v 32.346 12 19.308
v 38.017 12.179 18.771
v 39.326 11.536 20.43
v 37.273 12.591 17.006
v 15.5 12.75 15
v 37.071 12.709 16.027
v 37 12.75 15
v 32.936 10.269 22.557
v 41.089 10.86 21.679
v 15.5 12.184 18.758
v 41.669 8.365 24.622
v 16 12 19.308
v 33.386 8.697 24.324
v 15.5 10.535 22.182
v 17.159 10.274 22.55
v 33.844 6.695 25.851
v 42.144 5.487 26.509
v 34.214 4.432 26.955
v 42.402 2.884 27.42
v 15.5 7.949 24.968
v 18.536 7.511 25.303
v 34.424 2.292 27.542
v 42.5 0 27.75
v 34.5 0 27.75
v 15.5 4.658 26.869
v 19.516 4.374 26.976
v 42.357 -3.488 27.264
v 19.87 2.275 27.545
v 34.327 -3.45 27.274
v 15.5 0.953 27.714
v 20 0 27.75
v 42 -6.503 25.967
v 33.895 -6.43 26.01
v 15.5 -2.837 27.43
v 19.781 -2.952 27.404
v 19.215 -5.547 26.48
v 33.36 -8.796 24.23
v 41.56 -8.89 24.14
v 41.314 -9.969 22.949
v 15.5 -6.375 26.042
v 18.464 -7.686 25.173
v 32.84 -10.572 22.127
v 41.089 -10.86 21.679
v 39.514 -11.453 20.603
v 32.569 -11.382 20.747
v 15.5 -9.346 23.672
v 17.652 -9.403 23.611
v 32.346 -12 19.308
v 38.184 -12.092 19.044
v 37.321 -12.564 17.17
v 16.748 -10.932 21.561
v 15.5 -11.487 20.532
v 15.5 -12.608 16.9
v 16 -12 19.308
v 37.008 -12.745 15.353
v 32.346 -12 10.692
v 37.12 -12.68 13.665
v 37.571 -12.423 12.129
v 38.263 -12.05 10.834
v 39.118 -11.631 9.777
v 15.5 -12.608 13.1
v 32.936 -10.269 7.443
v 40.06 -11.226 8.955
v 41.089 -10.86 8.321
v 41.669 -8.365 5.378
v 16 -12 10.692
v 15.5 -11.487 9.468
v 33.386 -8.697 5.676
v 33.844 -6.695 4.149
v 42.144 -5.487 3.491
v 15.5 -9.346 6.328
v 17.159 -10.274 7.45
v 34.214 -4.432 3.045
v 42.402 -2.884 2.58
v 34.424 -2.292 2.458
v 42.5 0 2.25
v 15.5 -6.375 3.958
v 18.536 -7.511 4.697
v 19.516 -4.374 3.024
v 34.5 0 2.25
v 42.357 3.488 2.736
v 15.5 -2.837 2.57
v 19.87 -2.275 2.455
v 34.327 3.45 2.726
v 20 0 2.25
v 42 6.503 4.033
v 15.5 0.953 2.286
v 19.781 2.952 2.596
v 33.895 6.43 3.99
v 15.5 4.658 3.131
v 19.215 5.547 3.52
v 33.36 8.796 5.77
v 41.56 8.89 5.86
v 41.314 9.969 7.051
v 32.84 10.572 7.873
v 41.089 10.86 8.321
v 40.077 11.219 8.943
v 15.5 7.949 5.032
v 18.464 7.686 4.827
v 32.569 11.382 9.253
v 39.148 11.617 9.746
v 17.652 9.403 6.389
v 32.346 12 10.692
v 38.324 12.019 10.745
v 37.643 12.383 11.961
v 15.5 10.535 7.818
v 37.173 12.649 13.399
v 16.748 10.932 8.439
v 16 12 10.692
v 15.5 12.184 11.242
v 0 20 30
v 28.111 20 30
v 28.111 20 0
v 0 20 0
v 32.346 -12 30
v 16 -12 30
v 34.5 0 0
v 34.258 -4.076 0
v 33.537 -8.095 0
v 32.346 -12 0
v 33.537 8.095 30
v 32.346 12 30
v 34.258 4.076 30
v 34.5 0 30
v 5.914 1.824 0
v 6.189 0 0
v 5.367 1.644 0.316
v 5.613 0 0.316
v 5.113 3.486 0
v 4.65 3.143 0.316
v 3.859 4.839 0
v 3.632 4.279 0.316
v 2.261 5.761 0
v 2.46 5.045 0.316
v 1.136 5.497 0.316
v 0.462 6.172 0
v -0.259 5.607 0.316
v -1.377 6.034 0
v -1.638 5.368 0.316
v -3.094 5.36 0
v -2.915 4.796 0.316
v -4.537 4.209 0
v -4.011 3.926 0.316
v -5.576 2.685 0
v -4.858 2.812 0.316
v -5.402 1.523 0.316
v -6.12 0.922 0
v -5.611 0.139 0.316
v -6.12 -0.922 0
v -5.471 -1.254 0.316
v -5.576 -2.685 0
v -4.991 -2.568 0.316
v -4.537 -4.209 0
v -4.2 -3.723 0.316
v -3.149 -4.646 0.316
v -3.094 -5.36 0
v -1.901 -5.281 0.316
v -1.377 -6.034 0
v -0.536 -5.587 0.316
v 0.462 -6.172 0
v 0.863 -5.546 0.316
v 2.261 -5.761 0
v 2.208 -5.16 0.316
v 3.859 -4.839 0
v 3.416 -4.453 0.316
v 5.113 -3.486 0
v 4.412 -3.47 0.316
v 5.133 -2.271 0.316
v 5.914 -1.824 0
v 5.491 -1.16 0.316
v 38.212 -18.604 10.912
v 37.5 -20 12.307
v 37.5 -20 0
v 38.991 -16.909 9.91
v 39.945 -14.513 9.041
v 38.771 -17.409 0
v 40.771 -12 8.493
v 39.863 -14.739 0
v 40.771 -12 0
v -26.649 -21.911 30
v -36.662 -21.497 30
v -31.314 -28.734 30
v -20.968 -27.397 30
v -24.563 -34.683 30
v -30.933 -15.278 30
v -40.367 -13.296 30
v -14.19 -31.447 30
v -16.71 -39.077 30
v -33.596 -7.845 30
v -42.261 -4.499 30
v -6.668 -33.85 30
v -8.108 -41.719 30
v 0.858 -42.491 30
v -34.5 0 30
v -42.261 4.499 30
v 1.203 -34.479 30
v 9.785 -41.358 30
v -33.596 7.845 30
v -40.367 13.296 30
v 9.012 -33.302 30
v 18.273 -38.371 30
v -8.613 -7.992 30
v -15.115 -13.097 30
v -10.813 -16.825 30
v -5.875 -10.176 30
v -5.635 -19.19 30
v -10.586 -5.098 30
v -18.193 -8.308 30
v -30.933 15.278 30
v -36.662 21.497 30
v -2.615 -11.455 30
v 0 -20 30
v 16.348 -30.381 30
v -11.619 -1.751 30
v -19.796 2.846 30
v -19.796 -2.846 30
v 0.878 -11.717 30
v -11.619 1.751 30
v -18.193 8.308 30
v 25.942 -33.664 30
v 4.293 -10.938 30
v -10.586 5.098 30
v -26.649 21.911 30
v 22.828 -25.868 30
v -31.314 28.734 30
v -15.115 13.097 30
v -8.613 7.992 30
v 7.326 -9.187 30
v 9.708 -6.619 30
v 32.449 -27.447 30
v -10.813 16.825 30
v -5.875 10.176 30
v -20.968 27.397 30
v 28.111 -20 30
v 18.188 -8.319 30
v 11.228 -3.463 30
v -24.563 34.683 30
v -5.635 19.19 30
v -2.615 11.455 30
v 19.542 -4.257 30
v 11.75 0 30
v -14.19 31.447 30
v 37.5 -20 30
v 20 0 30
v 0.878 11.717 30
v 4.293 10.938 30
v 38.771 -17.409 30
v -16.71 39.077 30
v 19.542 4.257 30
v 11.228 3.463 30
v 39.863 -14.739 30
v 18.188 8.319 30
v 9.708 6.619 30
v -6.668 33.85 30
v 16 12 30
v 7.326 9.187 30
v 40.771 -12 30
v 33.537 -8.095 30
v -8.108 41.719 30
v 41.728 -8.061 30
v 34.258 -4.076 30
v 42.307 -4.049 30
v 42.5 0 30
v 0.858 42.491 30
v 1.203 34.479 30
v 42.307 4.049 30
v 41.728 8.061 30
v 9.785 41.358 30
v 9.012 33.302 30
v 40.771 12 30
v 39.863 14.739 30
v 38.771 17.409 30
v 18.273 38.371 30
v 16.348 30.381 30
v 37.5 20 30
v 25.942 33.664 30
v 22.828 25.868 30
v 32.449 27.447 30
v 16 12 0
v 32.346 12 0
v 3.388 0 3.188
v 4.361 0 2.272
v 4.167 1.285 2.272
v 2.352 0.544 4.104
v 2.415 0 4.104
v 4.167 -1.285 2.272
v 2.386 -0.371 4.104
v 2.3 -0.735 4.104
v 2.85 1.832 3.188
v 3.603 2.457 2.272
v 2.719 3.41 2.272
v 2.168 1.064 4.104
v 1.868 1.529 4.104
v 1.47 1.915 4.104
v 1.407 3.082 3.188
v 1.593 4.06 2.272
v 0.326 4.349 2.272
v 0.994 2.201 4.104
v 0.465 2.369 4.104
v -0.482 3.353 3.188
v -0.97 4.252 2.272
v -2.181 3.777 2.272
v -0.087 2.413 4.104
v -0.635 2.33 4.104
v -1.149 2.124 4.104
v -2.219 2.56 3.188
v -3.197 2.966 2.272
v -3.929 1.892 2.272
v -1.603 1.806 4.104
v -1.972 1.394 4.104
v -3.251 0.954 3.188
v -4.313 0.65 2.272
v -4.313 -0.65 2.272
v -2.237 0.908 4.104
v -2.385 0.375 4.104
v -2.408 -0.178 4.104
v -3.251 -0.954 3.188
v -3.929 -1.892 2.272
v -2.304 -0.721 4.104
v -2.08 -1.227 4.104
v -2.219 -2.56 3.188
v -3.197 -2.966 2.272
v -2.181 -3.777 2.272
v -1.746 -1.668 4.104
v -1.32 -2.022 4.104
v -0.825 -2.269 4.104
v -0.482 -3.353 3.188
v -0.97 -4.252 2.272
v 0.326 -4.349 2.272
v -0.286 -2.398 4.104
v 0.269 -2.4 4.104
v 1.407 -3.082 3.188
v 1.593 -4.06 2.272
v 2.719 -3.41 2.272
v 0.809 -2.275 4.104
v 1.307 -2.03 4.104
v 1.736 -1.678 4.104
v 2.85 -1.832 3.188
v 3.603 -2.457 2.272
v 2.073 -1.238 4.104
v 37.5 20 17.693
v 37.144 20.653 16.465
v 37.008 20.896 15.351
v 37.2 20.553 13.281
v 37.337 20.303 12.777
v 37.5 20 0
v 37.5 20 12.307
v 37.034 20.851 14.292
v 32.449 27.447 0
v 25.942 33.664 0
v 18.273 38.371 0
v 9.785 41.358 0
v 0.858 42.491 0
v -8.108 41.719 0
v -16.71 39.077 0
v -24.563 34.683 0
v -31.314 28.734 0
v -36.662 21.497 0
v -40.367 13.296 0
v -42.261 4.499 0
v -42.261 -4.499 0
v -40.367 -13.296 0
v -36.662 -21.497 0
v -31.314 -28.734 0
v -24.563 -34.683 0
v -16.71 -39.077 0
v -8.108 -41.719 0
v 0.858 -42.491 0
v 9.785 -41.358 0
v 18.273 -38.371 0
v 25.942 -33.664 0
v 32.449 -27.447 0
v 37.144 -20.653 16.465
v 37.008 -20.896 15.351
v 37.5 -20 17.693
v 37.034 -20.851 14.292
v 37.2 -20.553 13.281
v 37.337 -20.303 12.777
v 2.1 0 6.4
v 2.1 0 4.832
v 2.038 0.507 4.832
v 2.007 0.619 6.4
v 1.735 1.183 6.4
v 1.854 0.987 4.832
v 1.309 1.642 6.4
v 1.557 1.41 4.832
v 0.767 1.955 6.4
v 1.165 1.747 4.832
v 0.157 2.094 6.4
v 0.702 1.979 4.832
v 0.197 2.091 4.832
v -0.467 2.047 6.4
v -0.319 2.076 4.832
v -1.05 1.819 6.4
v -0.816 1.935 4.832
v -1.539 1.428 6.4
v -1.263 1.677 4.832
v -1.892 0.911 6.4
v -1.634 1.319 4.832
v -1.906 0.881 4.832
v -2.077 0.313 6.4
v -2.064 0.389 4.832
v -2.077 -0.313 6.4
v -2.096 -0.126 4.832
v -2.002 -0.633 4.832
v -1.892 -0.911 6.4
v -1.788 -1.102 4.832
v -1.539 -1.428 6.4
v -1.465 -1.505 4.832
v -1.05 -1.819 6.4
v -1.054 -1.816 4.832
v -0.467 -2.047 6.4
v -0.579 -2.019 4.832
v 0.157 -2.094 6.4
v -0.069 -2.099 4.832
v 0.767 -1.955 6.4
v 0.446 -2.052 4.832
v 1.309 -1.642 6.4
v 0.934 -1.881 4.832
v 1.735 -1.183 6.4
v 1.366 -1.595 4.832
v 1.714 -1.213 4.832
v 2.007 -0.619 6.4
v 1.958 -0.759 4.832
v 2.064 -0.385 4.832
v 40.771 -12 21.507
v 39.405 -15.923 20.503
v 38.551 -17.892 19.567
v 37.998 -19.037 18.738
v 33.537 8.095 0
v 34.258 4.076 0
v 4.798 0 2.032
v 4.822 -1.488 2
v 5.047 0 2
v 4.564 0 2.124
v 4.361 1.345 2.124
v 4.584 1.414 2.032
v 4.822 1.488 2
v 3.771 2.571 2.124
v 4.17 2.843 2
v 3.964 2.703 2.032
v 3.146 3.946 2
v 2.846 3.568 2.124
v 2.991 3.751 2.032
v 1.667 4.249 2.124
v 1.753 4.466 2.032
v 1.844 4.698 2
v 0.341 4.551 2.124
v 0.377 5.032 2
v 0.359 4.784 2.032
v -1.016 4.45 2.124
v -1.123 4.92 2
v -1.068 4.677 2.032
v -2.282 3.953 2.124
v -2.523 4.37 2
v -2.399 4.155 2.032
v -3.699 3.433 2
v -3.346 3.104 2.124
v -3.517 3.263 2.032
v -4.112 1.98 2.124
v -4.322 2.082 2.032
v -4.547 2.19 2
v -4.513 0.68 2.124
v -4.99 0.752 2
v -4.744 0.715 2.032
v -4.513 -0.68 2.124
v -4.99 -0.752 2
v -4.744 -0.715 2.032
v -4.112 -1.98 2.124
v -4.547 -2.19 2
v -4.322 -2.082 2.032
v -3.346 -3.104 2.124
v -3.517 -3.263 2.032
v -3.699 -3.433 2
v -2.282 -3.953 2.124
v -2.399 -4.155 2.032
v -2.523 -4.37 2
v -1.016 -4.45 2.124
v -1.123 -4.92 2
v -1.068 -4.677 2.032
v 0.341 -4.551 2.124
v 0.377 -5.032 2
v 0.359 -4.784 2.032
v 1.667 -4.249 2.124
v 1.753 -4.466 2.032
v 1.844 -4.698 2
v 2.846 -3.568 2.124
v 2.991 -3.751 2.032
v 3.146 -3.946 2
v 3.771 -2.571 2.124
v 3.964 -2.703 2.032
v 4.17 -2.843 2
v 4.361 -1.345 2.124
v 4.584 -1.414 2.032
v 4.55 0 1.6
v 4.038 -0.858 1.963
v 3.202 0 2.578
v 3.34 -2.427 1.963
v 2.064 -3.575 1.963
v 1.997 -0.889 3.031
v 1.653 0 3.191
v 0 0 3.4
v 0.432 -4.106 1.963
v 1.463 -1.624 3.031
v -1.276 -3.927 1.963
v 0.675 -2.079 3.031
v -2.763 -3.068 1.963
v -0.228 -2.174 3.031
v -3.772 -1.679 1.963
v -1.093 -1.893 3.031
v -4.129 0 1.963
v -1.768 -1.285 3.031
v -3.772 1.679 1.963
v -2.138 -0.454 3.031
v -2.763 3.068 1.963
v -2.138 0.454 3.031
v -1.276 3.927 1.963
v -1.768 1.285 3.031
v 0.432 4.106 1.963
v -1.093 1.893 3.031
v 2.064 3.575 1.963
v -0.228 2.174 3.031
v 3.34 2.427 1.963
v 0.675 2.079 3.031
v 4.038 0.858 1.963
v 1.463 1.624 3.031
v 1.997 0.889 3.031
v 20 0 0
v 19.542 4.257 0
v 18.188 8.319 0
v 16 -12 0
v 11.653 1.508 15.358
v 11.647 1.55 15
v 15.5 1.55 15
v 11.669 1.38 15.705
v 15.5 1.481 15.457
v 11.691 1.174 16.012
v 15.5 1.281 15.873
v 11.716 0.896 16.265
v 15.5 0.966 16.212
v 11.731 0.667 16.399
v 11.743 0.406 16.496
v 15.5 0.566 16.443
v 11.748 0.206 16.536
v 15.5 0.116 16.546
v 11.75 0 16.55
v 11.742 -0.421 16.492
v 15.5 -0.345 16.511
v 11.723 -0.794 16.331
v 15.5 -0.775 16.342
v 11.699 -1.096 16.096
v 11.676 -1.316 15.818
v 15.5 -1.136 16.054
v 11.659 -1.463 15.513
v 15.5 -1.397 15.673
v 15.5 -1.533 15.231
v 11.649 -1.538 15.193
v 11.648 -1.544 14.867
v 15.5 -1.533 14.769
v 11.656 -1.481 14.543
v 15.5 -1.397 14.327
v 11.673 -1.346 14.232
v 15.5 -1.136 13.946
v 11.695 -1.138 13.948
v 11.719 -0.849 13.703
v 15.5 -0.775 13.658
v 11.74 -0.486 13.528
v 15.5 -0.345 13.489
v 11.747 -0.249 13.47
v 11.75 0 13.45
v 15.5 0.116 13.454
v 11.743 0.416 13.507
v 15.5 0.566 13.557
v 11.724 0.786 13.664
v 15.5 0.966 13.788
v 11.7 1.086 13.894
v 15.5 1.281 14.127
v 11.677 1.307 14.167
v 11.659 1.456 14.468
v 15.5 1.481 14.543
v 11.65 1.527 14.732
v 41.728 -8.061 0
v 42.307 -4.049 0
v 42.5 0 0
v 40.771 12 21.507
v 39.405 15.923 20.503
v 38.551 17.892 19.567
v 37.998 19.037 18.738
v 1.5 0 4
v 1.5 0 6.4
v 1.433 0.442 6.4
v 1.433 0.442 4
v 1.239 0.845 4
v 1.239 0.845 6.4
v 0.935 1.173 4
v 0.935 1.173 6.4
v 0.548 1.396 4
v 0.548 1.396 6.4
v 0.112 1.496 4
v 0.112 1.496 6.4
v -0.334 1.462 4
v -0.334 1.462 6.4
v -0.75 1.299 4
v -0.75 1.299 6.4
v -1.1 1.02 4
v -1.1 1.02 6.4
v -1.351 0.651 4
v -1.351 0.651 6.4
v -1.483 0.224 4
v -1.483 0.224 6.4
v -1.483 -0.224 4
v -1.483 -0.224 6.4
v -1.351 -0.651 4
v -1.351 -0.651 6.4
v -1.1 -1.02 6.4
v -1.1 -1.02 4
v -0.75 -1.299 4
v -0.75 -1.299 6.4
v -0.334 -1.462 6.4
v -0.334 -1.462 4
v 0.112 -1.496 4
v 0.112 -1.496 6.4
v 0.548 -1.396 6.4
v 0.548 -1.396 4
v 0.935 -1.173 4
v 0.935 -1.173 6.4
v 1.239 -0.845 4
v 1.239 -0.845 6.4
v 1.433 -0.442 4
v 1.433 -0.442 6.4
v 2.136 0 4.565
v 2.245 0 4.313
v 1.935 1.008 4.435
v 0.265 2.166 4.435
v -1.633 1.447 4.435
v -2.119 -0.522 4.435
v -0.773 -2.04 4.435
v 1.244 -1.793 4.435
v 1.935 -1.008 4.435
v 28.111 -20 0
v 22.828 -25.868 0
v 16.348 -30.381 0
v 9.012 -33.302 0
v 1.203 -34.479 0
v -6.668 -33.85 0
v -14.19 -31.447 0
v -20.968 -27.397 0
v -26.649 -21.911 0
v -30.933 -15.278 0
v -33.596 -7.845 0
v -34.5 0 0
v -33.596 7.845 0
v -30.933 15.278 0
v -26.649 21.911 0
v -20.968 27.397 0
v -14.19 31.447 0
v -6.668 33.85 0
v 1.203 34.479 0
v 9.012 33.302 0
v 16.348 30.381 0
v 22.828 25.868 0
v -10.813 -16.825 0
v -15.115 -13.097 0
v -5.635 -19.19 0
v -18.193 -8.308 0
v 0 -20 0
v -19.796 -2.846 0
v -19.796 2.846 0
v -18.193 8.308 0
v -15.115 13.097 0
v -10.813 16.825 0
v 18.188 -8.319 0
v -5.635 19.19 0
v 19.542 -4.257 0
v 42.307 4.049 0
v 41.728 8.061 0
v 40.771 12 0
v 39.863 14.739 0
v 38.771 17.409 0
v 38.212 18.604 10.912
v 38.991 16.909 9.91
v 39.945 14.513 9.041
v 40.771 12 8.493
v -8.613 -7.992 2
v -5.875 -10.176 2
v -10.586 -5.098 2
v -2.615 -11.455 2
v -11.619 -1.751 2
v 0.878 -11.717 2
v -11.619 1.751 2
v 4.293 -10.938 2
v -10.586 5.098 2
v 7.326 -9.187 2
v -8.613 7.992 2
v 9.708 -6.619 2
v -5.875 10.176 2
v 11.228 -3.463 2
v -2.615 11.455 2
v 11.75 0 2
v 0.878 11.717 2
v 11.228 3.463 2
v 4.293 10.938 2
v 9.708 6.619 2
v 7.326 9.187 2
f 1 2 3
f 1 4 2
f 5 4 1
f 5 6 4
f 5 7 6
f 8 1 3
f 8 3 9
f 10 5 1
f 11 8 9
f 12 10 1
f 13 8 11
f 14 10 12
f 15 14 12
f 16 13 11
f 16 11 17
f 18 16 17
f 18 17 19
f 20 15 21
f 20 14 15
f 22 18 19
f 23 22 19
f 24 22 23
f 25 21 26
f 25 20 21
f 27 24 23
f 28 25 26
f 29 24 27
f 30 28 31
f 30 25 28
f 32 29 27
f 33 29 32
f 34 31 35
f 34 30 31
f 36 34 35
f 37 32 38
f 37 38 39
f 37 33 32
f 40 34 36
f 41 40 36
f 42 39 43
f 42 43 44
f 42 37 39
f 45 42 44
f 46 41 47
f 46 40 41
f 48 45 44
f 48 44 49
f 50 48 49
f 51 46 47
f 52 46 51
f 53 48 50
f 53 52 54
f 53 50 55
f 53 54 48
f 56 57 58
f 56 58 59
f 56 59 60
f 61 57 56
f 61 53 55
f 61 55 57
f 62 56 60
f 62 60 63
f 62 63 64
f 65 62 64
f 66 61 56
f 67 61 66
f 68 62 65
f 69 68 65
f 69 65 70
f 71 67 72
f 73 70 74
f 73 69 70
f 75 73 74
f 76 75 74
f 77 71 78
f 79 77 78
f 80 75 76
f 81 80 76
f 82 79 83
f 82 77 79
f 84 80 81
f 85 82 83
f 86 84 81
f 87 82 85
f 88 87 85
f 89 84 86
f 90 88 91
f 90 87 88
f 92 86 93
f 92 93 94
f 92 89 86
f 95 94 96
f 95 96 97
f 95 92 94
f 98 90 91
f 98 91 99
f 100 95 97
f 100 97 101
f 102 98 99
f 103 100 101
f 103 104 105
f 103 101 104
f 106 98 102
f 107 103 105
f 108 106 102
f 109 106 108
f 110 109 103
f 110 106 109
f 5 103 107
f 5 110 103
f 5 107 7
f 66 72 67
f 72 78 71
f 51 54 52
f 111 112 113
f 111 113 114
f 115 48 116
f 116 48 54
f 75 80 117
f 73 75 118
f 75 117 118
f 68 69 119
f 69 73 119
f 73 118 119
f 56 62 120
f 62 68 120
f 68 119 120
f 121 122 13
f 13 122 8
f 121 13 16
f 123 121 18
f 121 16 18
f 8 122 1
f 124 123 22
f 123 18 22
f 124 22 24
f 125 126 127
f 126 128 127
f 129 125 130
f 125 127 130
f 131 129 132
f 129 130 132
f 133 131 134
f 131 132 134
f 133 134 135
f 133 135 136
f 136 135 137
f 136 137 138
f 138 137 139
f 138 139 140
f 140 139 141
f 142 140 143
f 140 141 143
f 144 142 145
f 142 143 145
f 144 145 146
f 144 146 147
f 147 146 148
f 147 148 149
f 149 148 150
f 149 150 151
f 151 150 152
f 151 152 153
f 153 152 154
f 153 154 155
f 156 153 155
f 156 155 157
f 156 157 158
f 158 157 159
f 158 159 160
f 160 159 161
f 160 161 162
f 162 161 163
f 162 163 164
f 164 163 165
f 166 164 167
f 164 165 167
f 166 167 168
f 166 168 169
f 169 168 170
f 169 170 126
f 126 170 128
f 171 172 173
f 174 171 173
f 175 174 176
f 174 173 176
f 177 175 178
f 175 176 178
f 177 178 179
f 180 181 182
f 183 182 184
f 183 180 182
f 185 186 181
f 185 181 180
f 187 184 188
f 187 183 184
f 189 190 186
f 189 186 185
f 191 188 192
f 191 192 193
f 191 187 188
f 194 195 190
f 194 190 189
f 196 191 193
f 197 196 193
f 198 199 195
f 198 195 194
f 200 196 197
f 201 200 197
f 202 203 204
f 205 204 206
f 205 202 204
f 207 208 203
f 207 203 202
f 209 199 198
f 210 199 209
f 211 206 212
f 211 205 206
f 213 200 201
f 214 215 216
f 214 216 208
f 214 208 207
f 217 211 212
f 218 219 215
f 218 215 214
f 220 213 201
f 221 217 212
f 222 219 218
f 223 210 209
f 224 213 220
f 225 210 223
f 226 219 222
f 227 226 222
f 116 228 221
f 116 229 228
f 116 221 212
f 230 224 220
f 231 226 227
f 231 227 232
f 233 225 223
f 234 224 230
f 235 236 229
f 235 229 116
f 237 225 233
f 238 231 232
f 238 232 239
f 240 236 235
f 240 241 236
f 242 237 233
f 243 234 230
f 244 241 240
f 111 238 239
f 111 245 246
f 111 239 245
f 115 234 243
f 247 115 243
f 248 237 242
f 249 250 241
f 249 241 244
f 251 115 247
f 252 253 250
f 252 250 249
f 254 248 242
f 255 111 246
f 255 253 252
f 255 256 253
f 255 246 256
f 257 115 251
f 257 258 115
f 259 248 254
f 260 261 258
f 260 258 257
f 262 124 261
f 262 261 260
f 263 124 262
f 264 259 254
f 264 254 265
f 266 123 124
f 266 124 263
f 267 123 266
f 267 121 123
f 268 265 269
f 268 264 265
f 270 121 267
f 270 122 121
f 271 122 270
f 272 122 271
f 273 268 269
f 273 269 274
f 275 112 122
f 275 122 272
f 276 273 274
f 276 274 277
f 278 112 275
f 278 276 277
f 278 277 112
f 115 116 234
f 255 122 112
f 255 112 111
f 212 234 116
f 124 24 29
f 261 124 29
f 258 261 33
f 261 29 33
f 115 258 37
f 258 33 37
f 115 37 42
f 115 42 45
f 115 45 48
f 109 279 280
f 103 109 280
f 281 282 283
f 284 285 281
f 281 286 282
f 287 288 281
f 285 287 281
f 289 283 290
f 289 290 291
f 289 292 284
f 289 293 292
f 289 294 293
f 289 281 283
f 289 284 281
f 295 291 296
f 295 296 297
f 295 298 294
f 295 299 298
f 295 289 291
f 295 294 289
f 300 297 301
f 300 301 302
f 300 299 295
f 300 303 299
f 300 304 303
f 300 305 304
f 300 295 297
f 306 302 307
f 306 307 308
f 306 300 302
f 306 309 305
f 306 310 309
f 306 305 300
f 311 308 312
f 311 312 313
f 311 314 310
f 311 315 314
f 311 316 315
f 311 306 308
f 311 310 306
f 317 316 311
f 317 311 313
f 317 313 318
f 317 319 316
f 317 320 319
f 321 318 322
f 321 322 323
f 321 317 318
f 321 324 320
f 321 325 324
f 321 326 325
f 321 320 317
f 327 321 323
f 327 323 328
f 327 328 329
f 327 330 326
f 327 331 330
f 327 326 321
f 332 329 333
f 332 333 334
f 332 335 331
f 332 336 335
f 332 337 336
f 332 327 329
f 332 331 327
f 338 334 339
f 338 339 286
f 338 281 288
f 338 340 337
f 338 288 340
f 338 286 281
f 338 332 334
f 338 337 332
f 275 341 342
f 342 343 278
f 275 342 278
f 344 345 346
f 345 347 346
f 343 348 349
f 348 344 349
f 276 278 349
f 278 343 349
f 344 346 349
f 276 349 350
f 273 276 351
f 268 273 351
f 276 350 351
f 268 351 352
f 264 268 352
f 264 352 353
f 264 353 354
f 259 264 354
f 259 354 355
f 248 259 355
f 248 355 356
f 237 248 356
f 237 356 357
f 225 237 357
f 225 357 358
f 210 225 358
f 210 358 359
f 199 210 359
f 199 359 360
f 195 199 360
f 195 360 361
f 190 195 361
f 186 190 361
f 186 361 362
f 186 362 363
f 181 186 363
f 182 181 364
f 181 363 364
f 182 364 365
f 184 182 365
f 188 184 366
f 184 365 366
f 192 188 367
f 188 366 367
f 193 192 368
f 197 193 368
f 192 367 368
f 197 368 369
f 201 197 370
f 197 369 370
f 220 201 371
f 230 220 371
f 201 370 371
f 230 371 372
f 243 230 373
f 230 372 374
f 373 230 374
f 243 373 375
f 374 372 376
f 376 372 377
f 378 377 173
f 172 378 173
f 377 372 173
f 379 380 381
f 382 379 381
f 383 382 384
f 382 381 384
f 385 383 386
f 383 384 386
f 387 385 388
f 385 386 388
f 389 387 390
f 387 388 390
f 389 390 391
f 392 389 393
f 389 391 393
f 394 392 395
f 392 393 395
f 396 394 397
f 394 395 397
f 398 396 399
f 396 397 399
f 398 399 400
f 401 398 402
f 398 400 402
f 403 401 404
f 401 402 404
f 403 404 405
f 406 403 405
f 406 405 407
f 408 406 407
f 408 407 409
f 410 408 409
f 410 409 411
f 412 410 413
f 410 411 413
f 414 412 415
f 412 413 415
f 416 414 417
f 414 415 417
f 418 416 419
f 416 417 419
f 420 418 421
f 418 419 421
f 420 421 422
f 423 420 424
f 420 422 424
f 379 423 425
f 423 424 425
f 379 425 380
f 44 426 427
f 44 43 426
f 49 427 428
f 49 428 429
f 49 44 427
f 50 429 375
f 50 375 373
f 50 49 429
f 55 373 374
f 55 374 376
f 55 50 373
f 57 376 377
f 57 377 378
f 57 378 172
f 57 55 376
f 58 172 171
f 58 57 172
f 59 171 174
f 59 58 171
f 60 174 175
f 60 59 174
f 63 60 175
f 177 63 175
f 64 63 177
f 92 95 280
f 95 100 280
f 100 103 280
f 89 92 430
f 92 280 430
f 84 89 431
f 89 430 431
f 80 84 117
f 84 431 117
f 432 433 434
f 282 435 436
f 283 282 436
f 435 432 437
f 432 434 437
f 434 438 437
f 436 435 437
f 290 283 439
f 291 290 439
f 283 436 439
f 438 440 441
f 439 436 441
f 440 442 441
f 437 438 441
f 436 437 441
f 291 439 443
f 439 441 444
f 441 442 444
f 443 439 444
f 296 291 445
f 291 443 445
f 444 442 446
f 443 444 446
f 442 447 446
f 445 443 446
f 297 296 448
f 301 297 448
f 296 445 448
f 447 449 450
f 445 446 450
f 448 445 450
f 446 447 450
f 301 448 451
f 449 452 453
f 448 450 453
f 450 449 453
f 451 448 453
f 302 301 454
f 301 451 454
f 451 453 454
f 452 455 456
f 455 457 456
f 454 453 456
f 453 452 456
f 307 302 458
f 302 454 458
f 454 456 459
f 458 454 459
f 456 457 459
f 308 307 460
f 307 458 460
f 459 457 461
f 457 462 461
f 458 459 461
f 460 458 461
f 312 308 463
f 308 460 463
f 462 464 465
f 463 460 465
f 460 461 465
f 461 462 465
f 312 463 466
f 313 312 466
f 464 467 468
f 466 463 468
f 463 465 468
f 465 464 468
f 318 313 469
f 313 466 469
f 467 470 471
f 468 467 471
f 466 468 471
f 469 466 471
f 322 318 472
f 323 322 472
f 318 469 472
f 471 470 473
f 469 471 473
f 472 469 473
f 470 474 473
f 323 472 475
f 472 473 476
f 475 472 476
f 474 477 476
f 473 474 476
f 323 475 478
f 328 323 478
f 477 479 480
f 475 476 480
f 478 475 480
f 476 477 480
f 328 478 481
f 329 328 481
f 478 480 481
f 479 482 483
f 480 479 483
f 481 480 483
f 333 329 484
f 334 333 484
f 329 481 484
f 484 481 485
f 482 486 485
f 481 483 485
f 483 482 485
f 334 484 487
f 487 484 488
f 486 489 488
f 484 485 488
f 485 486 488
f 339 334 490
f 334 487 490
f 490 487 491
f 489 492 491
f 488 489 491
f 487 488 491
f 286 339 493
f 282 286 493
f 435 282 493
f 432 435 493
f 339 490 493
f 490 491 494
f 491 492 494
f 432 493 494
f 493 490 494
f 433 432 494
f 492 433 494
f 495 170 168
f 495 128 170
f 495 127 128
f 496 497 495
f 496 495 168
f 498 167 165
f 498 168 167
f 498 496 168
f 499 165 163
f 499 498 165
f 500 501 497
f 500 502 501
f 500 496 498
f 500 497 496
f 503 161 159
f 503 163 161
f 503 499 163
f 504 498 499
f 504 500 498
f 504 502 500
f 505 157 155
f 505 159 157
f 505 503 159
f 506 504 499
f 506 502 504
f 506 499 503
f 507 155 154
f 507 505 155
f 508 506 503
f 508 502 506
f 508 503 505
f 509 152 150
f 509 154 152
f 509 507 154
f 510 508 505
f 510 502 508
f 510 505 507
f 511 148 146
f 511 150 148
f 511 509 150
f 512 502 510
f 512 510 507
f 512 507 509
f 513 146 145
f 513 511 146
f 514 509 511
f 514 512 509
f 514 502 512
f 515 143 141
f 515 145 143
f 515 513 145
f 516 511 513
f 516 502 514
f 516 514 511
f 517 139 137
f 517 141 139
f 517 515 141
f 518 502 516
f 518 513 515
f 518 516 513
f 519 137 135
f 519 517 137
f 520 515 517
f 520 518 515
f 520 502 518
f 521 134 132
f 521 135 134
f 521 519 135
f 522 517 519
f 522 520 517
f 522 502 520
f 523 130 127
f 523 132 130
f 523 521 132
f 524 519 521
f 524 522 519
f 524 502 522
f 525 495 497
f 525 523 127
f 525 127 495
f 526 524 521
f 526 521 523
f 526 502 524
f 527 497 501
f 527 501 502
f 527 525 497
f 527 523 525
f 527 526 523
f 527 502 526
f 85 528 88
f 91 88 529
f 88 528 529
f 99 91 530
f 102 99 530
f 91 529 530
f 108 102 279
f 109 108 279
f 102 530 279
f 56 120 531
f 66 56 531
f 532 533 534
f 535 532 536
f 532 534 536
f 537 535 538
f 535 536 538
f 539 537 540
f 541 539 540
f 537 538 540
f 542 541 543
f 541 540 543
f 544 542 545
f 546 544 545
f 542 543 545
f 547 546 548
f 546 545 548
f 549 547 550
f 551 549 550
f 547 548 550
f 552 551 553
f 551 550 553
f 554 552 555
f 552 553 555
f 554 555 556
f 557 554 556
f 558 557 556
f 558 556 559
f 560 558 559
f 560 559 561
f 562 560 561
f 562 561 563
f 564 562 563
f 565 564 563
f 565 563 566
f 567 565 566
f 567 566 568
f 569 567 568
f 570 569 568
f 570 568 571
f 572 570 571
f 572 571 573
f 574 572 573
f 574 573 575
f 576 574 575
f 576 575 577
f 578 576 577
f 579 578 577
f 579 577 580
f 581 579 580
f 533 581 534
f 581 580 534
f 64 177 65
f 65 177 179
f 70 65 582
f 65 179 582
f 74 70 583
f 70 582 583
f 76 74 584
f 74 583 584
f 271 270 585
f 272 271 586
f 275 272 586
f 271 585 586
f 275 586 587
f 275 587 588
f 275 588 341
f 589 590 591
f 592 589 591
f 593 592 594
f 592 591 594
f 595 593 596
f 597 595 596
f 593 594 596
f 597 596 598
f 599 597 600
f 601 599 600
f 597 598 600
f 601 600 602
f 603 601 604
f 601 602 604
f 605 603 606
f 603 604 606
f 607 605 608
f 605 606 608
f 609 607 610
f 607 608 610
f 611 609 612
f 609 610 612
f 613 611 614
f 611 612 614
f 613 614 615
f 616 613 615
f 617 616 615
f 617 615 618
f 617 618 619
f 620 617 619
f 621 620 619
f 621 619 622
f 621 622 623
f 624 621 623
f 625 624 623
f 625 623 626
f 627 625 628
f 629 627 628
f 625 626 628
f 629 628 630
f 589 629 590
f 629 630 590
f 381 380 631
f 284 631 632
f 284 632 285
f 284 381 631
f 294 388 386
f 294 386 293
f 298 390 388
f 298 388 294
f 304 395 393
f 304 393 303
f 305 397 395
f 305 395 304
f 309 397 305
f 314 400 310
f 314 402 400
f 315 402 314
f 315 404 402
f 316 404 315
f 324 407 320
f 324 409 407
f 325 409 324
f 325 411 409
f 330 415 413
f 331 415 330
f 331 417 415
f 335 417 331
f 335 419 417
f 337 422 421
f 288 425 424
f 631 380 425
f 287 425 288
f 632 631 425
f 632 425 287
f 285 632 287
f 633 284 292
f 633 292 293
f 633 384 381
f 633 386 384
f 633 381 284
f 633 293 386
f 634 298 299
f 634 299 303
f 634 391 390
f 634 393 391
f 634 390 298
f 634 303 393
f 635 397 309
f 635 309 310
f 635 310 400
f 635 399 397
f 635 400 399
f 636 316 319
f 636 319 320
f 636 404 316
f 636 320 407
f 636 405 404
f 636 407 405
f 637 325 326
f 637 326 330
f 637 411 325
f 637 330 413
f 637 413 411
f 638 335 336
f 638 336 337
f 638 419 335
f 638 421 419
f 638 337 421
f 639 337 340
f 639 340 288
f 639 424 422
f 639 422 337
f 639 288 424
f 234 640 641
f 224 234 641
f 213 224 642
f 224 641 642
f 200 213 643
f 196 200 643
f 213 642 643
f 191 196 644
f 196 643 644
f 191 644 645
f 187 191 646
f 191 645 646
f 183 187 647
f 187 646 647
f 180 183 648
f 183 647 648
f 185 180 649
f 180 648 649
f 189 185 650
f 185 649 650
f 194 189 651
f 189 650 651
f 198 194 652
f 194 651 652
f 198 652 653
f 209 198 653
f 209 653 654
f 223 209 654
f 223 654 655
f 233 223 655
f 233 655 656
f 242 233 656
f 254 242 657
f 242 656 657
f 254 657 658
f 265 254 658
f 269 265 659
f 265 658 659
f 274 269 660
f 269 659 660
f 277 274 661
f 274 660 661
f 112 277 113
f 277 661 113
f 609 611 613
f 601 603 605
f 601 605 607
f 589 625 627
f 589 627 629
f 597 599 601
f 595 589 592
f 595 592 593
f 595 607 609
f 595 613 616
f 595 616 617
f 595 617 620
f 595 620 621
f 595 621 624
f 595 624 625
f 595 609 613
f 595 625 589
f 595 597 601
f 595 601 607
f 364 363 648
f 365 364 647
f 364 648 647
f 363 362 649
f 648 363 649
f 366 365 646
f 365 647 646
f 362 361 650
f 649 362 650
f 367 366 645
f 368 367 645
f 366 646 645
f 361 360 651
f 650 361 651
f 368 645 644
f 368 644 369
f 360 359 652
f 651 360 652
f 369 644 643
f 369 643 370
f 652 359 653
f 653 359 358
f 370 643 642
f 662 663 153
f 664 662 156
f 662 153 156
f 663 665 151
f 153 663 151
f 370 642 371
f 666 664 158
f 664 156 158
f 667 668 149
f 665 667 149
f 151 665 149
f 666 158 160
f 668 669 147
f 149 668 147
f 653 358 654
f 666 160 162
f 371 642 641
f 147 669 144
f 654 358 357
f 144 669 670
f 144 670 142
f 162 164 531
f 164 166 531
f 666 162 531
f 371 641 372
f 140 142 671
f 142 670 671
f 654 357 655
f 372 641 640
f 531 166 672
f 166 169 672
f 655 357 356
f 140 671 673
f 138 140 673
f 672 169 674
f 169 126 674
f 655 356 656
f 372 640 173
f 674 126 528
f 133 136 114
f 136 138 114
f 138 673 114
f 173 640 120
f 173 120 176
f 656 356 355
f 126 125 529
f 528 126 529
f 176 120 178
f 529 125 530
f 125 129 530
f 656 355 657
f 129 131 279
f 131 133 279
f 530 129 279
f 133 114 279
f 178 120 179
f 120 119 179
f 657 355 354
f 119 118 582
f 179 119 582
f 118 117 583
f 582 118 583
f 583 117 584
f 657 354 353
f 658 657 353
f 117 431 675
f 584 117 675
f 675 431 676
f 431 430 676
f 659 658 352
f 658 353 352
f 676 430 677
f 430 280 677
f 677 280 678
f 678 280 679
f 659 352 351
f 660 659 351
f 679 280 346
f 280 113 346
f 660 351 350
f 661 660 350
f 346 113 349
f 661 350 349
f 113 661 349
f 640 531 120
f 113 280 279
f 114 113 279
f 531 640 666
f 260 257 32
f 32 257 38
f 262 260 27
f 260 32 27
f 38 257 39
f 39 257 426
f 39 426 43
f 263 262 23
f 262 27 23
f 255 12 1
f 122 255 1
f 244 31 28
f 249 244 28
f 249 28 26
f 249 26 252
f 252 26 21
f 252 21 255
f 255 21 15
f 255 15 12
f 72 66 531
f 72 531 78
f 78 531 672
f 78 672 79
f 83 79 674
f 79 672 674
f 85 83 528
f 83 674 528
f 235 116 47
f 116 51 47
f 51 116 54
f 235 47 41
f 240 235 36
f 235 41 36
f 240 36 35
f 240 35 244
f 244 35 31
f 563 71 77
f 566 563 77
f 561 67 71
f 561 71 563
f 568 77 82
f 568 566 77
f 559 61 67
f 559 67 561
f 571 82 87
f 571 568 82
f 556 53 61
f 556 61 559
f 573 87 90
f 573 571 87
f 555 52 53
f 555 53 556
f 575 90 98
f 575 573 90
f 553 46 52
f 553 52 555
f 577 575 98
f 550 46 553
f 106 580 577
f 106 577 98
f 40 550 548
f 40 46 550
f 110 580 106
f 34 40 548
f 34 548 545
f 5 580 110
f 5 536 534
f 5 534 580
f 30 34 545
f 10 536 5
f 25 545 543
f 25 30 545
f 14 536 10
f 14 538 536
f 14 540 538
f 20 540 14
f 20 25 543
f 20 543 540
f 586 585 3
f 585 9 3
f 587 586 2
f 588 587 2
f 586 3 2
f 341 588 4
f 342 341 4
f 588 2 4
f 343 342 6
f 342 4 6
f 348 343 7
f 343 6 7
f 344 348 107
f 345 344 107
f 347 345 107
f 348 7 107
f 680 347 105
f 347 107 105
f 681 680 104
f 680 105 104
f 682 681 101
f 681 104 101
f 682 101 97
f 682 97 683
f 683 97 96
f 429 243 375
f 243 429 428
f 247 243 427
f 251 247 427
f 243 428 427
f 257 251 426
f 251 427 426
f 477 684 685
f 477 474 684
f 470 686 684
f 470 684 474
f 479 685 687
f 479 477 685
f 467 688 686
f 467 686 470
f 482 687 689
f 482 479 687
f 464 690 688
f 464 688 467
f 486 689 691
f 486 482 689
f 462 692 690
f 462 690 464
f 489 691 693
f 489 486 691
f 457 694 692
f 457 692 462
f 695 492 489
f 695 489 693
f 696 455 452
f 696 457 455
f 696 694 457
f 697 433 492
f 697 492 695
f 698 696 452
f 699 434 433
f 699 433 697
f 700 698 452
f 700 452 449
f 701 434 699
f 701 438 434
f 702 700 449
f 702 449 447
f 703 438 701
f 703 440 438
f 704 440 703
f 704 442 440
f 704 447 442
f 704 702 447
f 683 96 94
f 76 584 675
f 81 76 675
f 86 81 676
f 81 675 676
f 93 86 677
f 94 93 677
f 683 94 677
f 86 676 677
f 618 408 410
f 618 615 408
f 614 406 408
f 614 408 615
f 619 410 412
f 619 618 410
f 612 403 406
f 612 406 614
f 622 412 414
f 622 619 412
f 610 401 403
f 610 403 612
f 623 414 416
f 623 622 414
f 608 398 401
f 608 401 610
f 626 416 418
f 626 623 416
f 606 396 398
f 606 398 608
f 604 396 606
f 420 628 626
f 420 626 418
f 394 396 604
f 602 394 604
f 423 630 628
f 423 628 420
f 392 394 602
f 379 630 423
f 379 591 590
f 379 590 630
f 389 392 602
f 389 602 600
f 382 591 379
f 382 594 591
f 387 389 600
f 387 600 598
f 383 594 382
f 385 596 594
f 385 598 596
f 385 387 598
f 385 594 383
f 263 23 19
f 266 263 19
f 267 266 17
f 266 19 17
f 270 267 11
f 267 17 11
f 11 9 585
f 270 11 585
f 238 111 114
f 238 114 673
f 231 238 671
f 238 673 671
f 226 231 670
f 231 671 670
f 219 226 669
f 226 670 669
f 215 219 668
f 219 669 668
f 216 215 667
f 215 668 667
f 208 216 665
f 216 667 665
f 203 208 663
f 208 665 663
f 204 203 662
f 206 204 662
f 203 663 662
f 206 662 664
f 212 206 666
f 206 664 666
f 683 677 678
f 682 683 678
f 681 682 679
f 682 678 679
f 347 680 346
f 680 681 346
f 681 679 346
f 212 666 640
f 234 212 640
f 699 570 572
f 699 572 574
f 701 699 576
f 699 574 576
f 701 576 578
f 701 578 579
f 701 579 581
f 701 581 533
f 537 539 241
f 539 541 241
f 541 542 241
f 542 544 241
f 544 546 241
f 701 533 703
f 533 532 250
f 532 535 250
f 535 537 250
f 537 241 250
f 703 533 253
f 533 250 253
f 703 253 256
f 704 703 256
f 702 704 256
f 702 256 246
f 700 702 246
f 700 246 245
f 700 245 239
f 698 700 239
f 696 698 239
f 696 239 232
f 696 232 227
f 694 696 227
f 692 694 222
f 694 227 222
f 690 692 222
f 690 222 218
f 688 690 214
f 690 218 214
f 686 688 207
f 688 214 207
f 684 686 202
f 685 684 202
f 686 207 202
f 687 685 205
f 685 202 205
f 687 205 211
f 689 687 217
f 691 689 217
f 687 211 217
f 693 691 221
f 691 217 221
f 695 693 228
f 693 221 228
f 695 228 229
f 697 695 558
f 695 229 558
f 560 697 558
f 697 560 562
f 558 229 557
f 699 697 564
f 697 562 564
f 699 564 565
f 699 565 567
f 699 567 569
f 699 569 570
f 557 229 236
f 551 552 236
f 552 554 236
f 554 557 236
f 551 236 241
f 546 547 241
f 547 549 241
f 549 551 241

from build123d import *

# Parameters (mm, degrees)
F1_DEPTH      = 30
F3_START      = 15.5
F2_R          = 12.75
F3_DEPTH      = 30
F4_R          = 7.5
F5_DEPTH      = 25
F5_DEPTH_BACK = 25
F6_R          = 11.75
F7_DEPTH      = 28
F8_R          = 1.55
F9_DEPTH      = 10
F14_R         = 2.1
F15_DEPTH     = 2
F16_R         = 1.5
F17_DEPTH     = 2.4
F18_R         = 1


# Not quite as in the source:
# - a fillet or chamfer that OpenCascade refuses, or shapes differently, is made with other operations: its cross-section is extruded or revolved along the edge and cut away or added


with BuildPart() as f1:
    # F0 (on Top) → F1 (new body)
    with BuildSketch(Plane.XY):
        with BuildLine():
            Line((7.7707002638, -18.4286792096), (7.7707002638, 18.4286792096))
            ThreePointArc((7.7707002638, 18.4286792096), (3.963988888, 19.6032342254), (0, 20))
            ThreePointArc((0, 20), (-20, 0), (0, -20))
            ThreePointArc((0, -20), (3.963988888, -19.6032342254), (7.7707002638, -18.4286792096))
        make_face()
        with BuildLine():
            Line((7.7707002638, 18.4286792096), (7.7707002638, 20))
            Line((7.7707002638, 20), (0, 20))
            ThreePointArc((0, 20), (3.963988888, 19.6032342254), (7.7707002638, 18.4286792096))
        make_face()
        with BuildLine():
            Line((0, -20), (7.7707002638, -20))
            Line((7.7707002638, -20), (7.7707002638, -18.4286792096))
            ThreePointArc((7.7707002638, -18.4286792096), (3.963988888, -19.6032342254), (0, -20))
        make_face()
        with BuildLine():
            Line((15.7707002638, 12), (16, 12))
            ThreePointArc((16, 12), (12.3123323076, 15.7609159996), (7.7707002638, 18.4286792096))
            Line((7.7707002638, 18.4286792096), (7.7707002638, -18.4286792096))
            ThreePointArc((7.7707002638, -18.4286792096), (12.3123323076, -15.7609159996), (16, -12))
            Line((16, -12), (15.7707002638, -12))
            Line((15.7707002638, -12), (15.7707002638, 12))
        make_face()
        with BuildLine():
            ThreePointArc((28.1113855937, -20), (30.4920884675, -16.1394715183), (32.3457879793, -12))
            Line((32.3457879793, -12), (16, -12))
            ThreePointArc((16, -12), (12.3123323076, -15.7609159996), (7.7707002638, -18.4286792096))
            Line((7.7707002638, -18.4286792096), (7.7707002638, -20))
            Line((7.7707002638, -20), (28.1113855937, -20))
        make_face()
        with BuildLine():
            ThreePointArc((20, 0), (18.973665961, 6.3245553203), (16, 12))
            Line((16, 12), (15.7707002638, 12))
            Line((15.7707002638, 12), (15.7707002638, -12))
            Line((15.7707002638, -12), (16, -12))
            ThreePointArc((16, -12), (18.973665961, -6.3245553203), (20, 0))
        make_face()
        with BuildLine():
            Line((16, 12), (32.3457879793, 12))
            ThreePointArc((32.3457879793, 12), (30.4920884675, 16.1394715183), (28.1113855937, 20))
            Line((28.1113855937, 20), (7.7707002638, 20))
            Line((7.7707002638, 20), (7.7707002638, 18.4286792096))
            ThreePointArc((7.7707002638, 18.4286792096), (12.3123323076, 15.7609159996), (16, 12))
        make_face()
        with BuildLine():
            Line((32.3457879793, 12), (40.7707002638, 12))
            ThreePointArc((40.7707002638, 12), (39.3392377906, 16.0833569274), (37.5, 20))
            Line((37.5, 20), (28.1113855937, 20))
            ThreePointArc((28.1113855937, 20), (30.4920884675, 16.1394715183), (32.3457879793, 12))
        make_face()
        with BuildLine():
            Line((28.1113855937, 20), (37.5, 20))
            ThreePointArc((37.5, 20), (-42.5, 0), (37.5, -20))
            Line((37.5, -20), (28.1113855937, -20))
            ThreePointArc((28.1113855937, -20), (-34.5, 0), (28.1113855937, 20))
        make_face()
        with BuildLine():
            ThreePointArc((37.5, -20), (39.3392377906, -16.0833569274), (40.7707002638, -12))
            Line((40.7707002638, -12), (32.3457879793, -12))
            ThreePointArc((32.3457879793, -12), (30.4920884675, -16.1394715183), (28.1113855937, -20))
            Line((28.1113855937, -20), (37.5, -20))
        make_face()
        with BuildLine():
            Line((40.7707002638, -12), (40.7707002638, 12))
            Line((40.7707002638, 12), (32.3457879793, 12))
            ThreePointArc((32.3457879793, 12), (33.9571766, 6.0959131685), (34.5, 0))
            ThreePointArc((34.5, 0), (33.9571766, -6.0959131685), (32.3457879793, -12))
            Line((32.3457879793, -12), (40.7707002638, -12))
        make_face()
        with BuildLine():
            ThreePointArc((40.7707002638, -12), (42.0654535291, -6.0619814743), (42.5, 0))
            ThreePointArc((42.5, 0), (42.0654535291, 6.0619814743), (40.7707002638, 12))
            Line((40.7707002638, 12), (40.7707002638, -12))
        make_face()
    extrude(amount=F1_DEPTH)

    # F2 (on Right) → F3 (cut)
    with BuildSketch(Plane.YZ.offset(F3_START)):
        with Locations((0, 15)):
            Circle(F2_R)
    extrude(amount=F3_DEPTH, mode=Mode.SUBTRACT)

    # F4 (on Front) → F5 (cut, two sides)
    with BuildSketch(Plane.XZ) as f5_sk:
        with Locations((44.5, 15)):
            Circle(F4_R)
    extrude(amount=-F5_DEPTH, mode=Mode.SUBTRACT)
    extrude(f5_sk.sketch, amount=F5_DEPTH_BACK, mode=Mode.SUBTRACT)

    # F6 (on face) → F7 (cut)
    with BuildSketch(Plane.XY.offset(30)):
        Circle(F6_R)
    extrude(amount=-F7_DEPTH, mode=Mode.SUBTRACT)

    # F8 (on face) → F9 (cut)
    with BuildSketch(Plane.YZ.offset(15.5)):
        with Locations((0, 15)):
            Circle(F8_R)
    extrude(amount=-F9_DEPTH, mode=Mode.SUBTRACT)

    # F10 (on Front) → F11 (revolve)
    with BuildSketch(Plane.XZ):
        Polygon((0, 4.4), (0, 2), (4.65, 2), (2.1, 4.4), align=None)
    revolve(axis=Axis((0, 0, 6.6192487312), (0, 0, 1)))

    # F12 (on Front) → F13 (revolve, cut)
    with BuildSketch(Plane.XZ):
        with BuildLine():
            ThreePointArc((0, -9.9), (4.7022600949, -7.9522600949), (6.65, -3.25))
            ThreePointArc((6.65, -3.25), (4.7022600949, 1.4522600949), (0, 3.4))
            Line((0, 3.4), (0, -9.9))
        make_face()
    revolve(axis=Axis((0, 0, -3.25), (0, 0, -1)), mode=Mode.SUBTRACT)

    # F14 (on face) → F15 (join)
    with BuildSketch(Plane.XY.offset(4.4)):
        Circle(F14_R)
    extrude(amount=F15_DEPTH)

    # F16 (on face) → F17 (cut)
    with BuildSketch(Plane.XY.offset(6.4)):
        Circle(F16_R)
    extrude(amount=-F17_DEPTH, mode=Mode.SUBTRACT)

    # F18
    f18_edges = [f1.edges().sort_by_distance(p)[0] for p in [
        (-2.1, 0, 4.4),
        (-4.65, 0, 2),
    ]]
    fillet(f18_edges, radius=F18_R)

    # F19: chamfer of 0.4 on 1 edges, made by hand

    # F19_s1 → F19_t2 (revolve, cut)
    with BuildSketch(Plane.XZ):
        with BuildLine():
            Line((6.2028339317, -0.0077040086), (5.5986981628, 0.3241952337))
            Line((5.5986981628, 0.3241952337), (5.5919460169, 0.3199047179))
            ThreePointArc((5.5919460169, 0.3199047179), (5.6990064099, 0.1613765462), (5.7947443643, -0.0039097744))
            Line((5.7947443643, -0.0039097744), (5.8017238817, -0.008))
            ThreePointArc((5.8017238817, -0.008), (6.0022789067, -0.008), (6.2028339317, -0.0157040086))
            Line((6.2028339317, -0.0157040086), (6.2028339317, -0.0077040086))
        make_face()
    revolve(axis=Axis((0, 0, 0), (0, 0, 1)), mode=Mode.SUBTRACT)


solid = f1.part
